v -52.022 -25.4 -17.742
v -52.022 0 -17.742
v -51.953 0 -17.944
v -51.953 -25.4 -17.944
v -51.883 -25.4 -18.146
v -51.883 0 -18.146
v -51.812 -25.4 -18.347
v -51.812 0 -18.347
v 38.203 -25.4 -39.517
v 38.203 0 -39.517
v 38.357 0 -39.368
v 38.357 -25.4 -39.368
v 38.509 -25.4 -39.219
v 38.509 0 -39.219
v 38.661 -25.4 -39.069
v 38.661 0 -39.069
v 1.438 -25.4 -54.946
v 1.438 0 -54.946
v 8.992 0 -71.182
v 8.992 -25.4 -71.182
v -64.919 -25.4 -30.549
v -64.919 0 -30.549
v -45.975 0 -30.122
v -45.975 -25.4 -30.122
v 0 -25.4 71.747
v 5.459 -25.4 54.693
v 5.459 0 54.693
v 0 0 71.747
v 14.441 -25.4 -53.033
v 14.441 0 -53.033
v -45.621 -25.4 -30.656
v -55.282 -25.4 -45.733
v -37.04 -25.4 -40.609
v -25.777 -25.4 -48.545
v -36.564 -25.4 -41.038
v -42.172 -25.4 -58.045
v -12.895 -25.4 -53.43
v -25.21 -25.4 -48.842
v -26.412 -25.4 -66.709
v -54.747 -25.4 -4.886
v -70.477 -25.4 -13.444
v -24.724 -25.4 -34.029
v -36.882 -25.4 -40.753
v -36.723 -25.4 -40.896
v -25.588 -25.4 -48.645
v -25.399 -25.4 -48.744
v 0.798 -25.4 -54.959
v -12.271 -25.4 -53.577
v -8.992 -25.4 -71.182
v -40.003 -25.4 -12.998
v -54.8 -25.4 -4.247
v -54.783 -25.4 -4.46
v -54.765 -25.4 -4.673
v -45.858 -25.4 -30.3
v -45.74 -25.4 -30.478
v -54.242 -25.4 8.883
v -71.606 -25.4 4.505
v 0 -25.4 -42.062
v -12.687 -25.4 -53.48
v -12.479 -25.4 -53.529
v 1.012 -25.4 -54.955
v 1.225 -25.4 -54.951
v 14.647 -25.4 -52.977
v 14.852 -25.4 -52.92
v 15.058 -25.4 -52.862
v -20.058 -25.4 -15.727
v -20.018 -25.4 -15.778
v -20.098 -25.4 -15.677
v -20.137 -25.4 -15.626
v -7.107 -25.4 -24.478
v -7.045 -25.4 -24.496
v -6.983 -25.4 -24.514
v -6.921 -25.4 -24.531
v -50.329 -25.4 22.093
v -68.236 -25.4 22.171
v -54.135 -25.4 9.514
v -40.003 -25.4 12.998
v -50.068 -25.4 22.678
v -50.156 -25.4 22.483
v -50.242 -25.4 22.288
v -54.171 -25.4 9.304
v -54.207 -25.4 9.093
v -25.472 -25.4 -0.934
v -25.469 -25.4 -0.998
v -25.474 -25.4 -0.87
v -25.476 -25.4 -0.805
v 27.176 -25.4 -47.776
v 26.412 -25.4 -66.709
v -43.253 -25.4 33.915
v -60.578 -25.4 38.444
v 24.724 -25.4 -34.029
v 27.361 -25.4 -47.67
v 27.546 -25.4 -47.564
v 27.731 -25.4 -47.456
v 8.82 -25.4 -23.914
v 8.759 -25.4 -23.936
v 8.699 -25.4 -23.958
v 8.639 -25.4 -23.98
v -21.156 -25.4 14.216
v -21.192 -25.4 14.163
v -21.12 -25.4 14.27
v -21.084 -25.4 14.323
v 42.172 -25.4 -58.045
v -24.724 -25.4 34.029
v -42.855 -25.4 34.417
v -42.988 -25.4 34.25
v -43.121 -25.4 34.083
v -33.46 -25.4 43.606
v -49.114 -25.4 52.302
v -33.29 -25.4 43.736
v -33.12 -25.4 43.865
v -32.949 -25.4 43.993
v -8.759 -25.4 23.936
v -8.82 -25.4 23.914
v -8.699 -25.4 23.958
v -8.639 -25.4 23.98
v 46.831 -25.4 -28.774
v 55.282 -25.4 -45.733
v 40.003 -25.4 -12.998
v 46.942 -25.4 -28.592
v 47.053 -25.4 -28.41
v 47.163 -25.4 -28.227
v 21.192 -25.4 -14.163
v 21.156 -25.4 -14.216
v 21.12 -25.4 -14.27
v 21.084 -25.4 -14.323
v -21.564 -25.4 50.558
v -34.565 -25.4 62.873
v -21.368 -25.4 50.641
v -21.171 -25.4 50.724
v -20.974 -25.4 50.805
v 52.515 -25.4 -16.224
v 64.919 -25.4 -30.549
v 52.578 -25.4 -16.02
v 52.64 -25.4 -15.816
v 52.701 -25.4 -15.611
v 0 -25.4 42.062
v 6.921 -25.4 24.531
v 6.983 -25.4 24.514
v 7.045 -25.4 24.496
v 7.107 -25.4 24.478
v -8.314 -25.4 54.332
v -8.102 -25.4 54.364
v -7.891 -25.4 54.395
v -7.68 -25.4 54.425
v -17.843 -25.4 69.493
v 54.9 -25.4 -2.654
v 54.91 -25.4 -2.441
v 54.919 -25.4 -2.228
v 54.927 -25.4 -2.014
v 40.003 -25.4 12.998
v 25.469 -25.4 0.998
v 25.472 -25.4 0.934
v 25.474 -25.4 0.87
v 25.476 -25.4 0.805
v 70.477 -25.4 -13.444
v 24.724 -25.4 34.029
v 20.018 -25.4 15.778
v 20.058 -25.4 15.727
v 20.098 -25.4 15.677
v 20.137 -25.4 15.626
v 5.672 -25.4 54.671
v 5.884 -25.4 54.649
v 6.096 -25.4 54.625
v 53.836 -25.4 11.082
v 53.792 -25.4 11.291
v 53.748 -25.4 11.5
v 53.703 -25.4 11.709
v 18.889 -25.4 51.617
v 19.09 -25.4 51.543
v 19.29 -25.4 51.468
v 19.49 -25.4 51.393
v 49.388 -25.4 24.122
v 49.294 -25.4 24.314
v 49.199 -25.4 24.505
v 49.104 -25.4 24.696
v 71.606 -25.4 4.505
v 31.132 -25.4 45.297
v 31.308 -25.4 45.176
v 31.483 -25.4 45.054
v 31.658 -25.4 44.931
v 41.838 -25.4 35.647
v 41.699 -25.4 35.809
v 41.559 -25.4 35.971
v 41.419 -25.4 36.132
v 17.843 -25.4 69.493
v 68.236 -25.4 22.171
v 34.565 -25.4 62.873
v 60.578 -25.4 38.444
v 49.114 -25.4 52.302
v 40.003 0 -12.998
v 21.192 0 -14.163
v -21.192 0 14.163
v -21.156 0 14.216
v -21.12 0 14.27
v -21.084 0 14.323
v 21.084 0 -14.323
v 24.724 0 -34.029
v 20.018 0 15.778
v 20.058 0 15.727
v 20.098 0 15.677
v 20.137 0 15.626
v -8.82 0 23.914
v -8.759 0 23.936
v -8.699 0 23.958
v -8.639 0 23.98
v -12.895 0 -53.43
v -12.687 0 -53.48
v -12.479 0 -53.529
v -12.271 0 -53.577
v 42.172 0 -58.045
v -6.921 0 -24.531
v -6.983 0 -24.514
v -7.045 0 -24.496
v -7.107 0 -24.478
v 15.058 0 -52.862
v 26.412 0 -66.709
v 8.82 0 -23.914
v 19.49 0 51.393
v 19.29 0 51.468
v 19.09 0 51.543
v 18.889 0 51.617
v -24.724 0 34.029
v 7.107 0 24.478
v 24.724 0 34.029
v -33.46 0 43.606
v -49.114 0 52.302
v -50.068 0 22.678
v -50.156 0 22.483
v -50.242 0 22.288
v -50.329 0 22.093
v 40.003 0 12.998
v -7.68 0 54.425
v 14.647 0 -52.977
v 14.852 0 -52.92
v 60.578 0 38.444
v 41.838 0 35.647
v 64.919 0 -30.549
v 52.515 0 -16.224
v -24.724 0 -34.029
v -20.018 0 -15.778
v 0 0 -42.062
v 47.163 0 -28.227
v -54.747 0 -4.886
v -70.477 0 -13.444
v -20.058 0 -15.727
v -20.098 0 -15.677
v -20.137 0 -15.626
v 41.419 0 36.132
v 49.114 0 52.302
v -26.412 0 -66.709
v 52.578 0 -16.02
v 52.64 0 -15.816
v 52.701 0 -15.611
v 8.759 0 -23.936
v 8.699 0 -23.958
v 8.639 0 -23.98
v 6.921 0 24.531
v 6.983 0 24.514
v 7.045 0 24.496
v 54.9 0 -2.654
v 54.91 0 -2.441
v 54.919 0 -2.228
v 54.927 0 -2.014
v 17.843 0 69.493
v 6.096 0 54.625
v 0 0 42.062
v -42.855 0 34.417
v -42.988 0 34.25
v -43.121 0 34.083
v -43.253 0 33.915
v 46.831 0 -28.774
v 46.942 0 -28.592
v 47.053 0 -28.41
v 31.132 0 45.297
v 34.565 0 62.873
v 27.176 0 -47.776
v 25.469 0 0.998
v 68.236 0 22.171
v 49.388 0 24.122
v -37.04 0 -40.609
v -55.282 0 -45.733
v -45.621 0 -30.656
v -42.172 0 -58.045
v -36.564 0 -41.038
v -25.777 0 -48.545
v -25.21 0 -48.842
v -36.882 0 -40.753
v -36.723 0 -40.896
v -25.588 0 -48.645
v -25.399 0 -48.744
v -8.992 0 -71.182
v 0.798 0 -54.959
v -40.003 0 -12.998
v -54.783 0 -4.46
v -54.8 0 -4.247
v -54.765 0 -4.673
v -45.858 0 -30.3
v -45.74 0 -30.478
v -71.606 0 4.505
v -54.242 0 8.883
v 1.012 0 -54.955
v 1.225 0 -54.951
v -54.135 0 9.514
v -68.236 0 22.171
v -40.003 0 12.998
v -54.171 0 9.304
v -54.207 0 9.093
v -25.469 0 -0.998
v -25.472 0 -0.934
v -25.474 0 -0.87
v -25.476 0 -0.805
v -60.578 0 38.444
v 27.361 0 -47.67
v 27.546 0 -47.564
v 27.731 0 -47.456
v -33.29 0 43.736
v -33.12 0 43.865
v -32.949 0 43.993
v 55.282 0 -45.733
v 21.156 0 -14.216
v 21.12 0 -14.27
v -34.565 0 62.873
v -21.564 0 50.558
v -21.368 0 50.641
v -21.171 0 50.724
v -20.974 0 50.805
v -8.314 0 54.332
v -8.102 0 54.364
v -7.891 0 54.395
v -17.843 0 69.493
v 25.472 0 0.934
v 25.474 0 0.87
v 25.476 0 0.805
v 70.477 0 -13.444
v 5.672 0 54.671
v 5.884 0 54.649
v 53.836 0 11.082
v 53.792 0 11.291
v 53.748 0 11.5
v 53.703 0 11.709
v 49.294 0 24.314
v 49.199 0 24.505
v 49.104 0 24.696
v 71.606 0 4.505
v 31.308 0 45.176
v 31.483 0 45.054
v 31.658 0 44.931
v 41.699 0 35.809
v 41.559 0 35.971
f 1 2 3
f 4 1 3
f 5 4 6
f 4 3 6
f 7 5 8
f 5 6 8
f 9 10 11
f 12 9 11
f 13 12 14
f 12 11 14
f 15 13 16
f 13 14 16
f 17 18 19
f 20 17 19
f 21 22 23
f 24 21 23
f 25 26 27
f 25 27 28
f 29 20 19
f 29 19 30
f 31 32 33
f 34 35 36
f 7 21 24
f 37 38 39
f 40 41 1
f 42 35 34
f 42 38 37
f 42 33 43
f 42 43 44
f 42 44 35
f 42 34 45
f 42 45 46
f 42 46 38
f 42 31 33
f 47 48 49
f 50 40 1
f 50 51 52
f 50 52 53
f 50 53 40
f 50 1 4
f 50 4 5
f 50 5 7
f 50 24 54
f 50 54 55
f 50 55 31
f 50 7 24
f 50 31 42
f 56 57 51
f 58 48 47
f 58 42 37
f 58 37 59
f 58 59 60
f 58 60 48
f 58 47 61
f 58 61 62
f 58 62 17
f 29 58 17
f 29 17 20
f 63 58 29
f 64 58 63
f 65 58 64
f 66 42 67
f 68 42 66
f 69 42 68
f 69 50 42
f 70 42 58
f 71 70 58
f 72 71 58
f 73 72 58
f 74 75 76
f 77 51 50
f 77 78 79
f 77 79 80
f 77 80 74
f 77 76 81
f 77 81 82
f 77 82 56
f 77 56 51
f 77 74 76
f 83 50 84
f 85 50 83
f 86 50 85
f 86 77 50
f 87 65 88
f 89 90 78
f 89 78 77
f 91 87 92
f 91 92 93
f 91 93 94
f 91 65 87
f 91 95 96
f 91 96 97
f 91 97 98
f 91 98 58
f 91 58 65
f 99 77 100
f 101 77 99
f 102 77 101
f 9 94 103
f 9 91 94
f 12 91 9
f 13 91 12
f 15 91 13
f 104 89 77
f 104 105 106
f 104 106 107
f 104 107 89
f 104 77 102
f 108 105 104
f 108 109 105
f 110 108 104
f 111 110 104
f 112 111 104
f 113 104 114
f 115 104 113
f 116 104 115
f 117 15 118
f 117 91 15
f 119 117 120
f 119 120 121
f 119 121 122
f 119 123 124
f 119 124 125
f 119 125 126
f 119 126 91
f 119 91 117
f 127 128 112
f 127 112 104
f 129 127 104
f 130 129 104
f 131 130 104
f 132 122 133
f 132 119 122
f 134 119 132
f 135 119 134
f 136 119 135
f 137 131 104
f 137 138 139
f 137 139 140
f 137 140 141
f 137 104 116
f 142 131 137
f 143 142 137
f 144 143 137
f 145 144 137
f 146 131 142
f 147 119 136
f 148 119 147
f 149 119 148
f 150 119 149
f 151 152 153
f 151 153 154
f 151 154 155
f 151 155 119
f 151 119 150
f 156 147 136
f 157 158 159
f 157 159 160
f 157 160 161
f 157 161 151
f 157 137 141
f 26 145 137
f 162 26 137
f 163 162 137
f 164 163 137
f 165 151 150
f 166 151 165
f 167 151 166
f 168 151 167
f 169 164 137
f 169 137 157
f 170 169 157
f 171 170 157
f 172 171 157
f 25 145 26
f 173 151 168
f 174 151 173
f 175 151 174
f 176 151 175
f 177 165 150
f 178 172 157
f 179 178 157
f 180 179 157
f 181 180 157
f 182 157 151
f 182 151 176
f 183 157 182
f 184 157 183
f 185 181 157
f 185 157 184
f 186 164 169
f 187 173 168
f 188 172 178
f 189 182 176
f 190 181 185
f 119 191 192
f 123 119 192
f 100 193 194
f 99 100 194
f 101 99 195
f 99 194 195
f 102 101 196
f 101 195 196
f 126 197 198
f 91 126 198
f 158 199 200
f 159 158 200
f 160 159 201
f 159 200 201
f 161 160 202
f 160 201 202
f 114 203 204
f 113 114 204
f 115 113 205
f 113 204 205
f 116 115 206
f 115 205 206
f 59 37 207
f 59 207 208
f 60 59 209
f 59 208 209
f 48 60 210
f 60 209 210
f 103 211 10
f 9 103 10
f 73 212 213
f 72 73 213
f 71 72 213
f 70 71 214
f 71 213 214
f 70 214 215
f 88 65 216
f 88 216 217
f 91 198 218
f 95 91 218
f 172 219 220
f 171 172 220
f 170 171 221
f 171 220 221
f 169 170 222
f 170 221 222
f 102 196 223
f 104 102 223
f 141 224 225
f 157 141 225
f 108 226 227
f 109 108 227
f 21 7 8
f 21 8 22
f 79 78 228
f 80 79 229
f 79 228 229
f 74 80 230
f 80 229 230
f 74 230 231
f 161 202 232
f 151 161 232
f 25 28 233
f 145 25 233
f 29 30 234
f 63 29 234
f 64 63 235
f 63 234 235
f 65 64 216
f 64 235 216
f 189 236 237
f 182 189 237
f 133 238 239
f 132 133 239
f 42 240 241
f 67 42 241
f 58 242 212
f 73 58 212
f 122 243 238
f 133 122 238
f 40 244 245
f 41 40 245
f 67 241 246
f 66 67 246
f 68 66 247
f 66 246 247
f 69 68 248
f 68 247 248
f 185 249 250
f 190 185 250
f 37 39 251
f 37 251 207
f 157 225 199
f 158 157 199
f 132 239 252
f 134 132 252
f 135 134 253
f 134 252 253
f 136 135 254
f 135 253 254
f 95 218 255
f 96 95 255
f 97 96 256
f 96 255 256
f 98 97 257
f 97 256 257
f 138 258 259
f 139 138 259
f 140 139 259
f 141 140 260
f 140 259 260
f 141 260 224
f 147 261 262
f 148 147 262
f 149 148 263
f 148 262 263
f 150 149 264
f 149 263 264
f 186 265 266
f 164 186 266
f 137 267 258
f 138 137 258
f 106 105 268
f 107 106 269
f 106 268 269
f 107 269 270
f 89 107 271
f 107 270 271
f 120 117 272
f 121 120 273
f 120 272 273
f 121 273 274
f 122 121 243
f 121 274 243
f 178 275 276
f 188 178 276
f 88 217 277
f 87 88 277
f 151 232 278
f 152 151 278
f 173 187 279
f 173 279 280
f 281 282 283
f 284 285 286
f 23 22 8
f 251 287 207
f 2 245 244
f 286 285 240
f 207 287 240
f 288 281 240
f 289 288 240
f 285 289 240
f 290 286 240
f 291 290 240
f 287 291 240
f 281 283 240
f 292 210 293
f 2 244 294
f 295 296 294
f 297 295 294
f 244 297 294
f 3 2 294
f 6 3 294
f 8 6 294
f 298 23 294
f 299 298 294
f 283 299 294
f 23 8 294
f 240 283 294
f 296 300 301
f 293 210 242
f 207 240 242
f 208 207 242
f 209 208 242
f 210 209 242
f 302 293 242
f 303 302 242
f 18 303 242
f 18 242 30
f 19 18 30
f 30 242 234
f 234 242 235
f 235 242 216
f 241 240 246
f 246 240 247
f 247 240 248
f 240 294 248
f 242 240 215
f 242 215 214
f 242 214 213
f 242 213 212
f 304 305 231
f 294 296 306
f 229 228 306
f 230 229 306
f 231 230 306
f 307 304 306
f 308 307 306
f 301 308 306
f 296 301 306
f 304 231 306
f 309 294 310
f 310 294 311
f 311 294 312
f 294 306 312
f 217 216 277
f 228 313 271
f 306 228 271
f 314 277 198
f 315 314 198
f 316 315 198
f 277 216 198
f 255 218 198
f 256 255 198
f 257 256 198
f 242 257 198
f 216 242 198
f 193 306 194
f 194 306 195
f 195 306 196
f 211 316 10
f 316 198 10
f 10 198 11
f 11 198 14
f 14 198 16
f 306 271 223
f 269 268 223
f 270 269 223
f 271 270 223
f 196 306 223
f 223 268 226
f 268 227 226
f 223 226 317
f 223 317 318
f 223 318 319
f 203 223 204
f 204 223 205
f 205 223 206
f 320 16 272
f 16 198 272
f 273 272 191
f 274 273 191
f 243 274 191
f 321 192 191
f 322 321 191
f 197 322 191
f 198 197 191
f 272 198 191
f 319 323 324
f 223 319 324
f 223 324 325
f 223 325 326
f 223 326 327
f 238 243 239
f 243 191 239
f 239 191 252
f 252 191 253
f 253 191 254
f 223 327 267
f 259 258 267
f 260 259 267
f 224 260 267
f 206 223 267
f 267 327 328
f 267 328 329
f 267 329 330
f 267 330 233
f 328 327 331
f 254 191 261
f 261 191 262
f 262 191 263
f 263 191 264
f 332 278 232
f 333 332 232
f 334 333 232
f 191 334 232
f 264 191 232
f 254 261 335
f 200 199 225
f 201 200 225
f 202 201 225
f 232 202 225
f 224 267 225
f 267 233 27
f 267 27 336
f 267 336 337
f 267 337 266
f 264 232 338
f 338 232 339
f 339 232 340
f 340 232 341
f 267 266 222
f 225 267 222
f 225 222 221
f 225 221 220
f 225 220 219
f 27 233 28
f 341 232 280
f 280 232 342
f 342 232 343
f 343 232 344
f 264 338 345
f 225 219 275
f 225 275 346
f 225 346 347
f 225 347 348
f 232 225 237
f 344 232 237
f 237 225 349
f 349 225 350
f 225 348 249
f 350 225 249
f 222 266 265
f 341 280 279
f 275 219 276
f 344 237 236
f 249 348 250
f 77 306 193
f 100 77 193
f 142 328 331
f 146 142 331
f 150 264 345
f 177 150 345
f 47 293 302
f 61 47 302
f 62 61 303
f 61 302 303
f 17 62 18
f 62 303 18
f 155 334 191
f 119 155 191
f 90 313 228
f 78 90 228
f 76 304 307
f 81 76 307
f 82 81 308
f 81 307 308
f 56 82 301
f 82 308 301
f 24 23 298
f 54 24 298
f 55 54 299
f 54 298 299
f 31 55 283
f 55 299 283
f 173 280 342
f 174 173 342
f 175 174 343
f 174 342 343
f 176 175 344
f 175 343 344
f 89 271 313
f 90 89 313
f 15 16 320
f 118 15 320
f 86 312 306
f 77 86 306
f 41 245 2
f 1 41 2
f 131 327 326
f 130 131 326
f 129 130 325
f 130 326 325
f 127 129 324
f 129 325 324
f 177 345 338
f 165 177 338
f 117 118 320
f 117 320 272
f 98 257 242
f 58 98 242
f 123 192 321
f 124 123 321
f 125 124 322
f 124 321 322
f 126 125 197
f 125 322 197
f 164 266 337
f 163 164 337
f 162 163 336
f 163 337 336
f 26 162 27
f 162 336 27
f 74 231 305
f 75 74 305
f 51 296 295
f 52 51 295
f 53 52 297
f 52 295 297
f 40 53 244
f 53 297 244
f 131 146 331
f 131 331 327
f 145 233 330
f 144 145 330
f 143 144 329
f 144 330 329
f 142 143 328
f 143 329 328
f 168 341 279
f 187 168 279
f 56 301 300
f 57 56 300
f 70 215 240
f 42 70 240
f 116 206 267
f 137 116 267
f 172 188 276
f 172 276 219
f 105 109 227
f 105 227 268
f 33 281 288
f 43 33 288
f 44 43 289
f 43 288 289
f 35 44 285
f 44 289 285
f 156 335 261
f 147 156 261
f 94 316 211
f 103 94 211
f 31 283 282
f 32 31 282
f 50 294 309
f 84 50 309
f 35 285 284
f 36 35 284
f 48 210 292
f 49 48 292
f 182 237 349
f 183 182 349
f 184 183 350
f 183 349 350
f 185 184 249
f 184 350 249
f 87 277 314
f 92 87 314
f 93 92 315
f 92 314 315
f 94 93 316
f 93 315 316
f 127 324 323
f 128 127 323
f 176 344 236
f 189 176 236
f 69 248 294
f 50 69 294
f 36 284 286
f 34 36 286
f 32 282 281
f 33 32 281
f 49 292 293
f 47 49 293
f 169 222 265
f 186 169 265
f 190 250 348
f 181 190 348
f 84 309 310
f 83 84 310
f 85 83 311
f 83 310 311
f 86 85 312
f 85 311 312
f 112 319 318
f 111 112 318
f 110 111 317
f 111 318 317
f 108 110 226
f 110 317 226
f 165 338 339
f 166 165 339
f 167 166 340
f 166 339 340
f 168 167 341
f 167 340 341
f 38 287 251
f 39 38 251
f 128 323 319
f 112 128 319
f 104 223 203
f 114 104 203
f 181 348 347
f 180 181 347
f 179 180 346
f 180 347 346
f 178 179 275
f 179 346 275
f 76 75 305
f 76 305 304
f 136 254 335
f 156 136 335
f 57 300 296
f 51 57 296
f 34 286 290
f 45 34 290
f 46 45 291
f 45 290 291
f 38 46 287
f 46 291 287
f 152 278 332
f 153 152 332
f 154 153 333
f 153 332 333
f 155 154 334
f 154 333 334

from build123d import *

# Parameters (mm, degrees)
F1_DEPTH = 25.4


with BuildPart() as f1:
    # F0 (on Front) → F1 (new body)
    with BuildSketch(Plane.XZ):
        with BuildLine():
            ThreePointArc((54.927443, -2.014457), (54.955138, -1.007398), (54.96437, 0))
            ThreePointArc((54.96437, 0), (54.681442, 5.569728), (53.835571, 11.082115))
            ThreePointArc((53.835571, 11.082115), (53.770084, 11.395616), (53.702771, 11.70873))
            ThreePointArc((53.702771, 11.70873), (51.917841, 18.044937), (49.388218, 24.122312))
            ThreePointArc((49.388218, 24.122312), (49.246823, 24.409678), (49.103757, 24.696215))
            ThreePointArc((49.103757, 24.696215), (45.799154, 30.389464), (41.837621, 35.646816))
            ThreePointArc((41.837621, 35.646816), (41.629204, 35.88999), (41.419373, 36.131946))
            ThreePointArc((41.419373, 36.131946), (36.802736, 40.82451), (31.658212, 44.931499))
            ThreePointArc((31.658212, 44.931499), (31.395868, 45.115202), (31.132458, 45.297374))
            ThreePointArc((31.132458, 45.297374), (25.493868, 48.694401), (19.489602, 51.39297))
            ThreePointArc((19.489602, 51.39297), (19.189815, 51.50566), (18.889376, 51.616601))
            ThreePointArc((18.889376, 51.616601), (12.583126, 53.504644), (6.096388, 54.625233))
            ThreePointArc((6.096388, 54.625233), (5.777995, 54.659828), (5.459405, 54.692567))
            ThreePointArc((5.459405, 54.692567), (-1.11826, 54.952994), (-7.679884, 54.425191))
            ThreePointArc((-7.679884, 54.425191), (-7.996878, 54.379518), (-8.313601, 54.331998))
            ThreePointArc((-8.313601, 54.331998), (-14.749381, 52.948444), (-20.973601, 50.805414))
            ThreePointArc((-20.973601, 50.805414), (-21.269278, 50.682342), (-21.564232, 50.55755))
            ThreePointArc((-21.564232, 50.55755), (-27.453745, 47.61695), (-32.949469, 43.993346))
            ThreePointArc((-32.949469, 43.993346), (-33.20525, 43.800609), (-33.459904, 43.606385))
            ThreePointArc((-33.459904, 43.606385), (-38.433089, 39.293507), (-42.855001, 34.417014))
            ThreePointArc((-42.855001, 34.417014), (-43.054815, 34.166723), (-43.253166, 33.915271))
            ThreePointArc((-43.253166, 33.915271), (-46.99754, 28.501109), (-50.067796, 22.678135))
            ThreePointArc((-50.067796, 22.678135), (-50.199087, 22.386015), (-50.328674, 22.093135))
            ThreePointArc((-50.328674, 22.093135), (-52.608964, 15.917881), (-54.134647, 9.514305))
            ThreePointArc((-54.134647, 9.514305), (-54.189166, 9.198712), (-54.241845, 8.882806))
            ThreePointArc((-54.241845, 8.882806), (-54.914772, 2.334474), (-54.800019, -4.247343))
            ThreePointArc((-54.800019, -4.247343), (-54.77434, -4.56658), (-54.746802, -4.885662))
            ThreePointArc((-54.746802, -4.885662), (-53.770084, -11.395616), (-52.022104, -17.742116))
            ThreePointArc((-52.022104, -17.742116), (-51.917841, -18.044937), (-51.811816, -18.347146))
            ThreePointArc((-51.811816, -18.347146), (-49.246823, -24.409678), (-45.975449, -30.122086))
            ThreePointArc((-45.975449, -30.122086), (-45.799154, -30.389464), (-45.621303, -30.655811))
            ThreePointArc((-45.621303, -30.655811), (-41.629204, -35.88999), (-37.039988, -40.609374))
            ThreePointArc((-37.039988, -40.609374), (-36.802736, -40.82451), (-36.564235, -41.038259))
            ThreePointArc((-36.564235, -41.038259), (-31.395868, -45.115202), (-25.777168, -48.545027))
            ThreePointArc((-25.777168, -48.545027), (-25.493868, -48.694401), (-25.209703, -48.842122))
            ThreePointArc((-25.209703, -48.842122), (-19.189815, -51.50566), (-12.894674, -53.430416))
            ThreePointArc((-12.894674, -53.430416), (-12.583126, -53.504644), (-12.271152, -53.577055))
            ThreePointArc((-12.271152, -53.577055), (-5.777995, -54.659828), (0.798041, -54.958577))
            ThreePointArc((0.798041, -54.958577), (1.11826, -54.952994), (1.438441, -54.945545))
            ThreePointArc((1.438441, -54.945545), (7.996878, -54.379518), (14.440611, -53.033487))
            ThreePointArc((14.440611, -53.033487), (14.749381, -52.948444), (15.057651, -52.861604))
            ThreePointArc((15.057651, -52.861604), (21.269278, -50.682342), (27.175824, -47.776109))
            ThreePointArc((27.175824, -47.776109), (27.453745, -47.61695), (27.730733, -47.456174))
            ThreePointArc((27.730733, -47.456174), (33.20525, -43.800609), (38.203481, -39.516782))
            ThreePointArc((38.203481, -39.516782), (38.433089, -39.293507), (38.661392, -39.068898))
            ThreePointArc((38.661392, -39.068898), (43.054815, -34.166723), (46.830672, -28.77447))
            ThreePointArc((46.830672, -28.77447), (46.99754, -28.501109), (47.162813, -28.226779))
            ThreePointArc((47.162813, -28.226779), (50.199087, -22.386015), (52.51532, -16.224152))
            ThreePointArc((52.51532, -16.224152), (52.608964, -15.917881), (52.700821, -15.611069))
            ThreePointArc((52.700821, -15.611069), (54.189166, -9.198712), (54.900238, -2.654412))
            ThreePointArc((54.900238, -2.654412), (54.914772, -2.334474), (54.927443, -2.014457))
        make_face()
        with BuildLine():
            ThreePointArc((25.469281, 0.998052), (25.472873, 0.901722), (25.476102, 0.80538))
            Line((25.476102, 0.80538), (40.003491, -12.997922))
            Line((40.003491, -12.997922), (21.191721, -14.163027))
            ThreePointArc((21.191721, -14.163027), (21.138007, -14.243071), (21.08399, -14.32291))
            Line((21.08399, -14.32291), (24.723517, -34.029002))
            Line((24.723517, -34.029002), (8.819644, -23.914311))
            ThreePointArc((8.819644, -23.914311), (8.72914, -23.947495), (8.638511, -23.980336))
            Line((8.638511, -23.980336), (0, -42.06216))
            Line((0, -42.06216), (-6.921237, -24.531141))
            ThreePointArc((-6.921237, -24.531141), (-7.013962, -24.50479), (-7.106586, -24.478089))
            Line((-7.106586, -24.478089), (-24.723517, -34.029002))
            Line((-24.723517, -34.029002), (-20.018441, -15.777909))
            ThreePointArc((-20.018441, -15.777909), (-20.077968, -15.702088), (-20.137208, -15.626043))
            Line((-20.137208, -15.626043), (-40.003491, -12.997922))
            Line((-40.003491, -12.997922), (-25.469281, -0.998052))
            ThreePointArc((-25.469281, -0.998052), (-25.472873, -0.901722), (-25.476102, -0.80538))
            Line((-25.476102, -0.80538), (-40.003491, 12.997922))
            Line((-40.003491, 12.997922), (-21.191721, 14.163027))
            ThreePointArc((-21.191721, 14.163027), (-21.138007, 14.243071), (-21.08399, 14.32291))
            Line((-21.08399, 14.32291), (-24.723517, 34.029002))
            Line((-24.723517, 34.029002), (-8.819644, 23.914311))
            ThreePointArc((-8.819644, 23.914311), (-8.72914, 23.947495), (-8.638511, 23.980336))
            Line((-8.638511, 23.980336), (0, 42.06216))
            Line((0, 42.06216), (6.921237, 24.531141))
            ThreePointArc((6.921237, 24.531141), (7.013962, 24.50479), (7.106586, 24.478089))
            Line((7.106586, 24.478089), (24.723517, 34.029002))
            Line((24.723517, 34.029002), (20.018441, 15.777909))
            ThreePointArc((20.018441, 15.777909), (20.077968, 15.702088), (20.137208, 15.626043))
            Line((20.137208, 15.626043), (40.003491, 12.997922))
            Line((40.003491, 12.997922), (25.469281, 0.998052))
        make_face(mode=Mode.SUBTRACT)
        with BuildLine():
            ThreePointArc((-42.855001, 34.417014), (-38.433089, 39.293507), (-33.459904, 43.606385))
            Line((-33.459904, 43.606385), (-49.114439, 52.301566))
            Line((-49.114439, 52.301566), (-42.855001, 34.417014))
        make_face()
        with BuildLine():
            ThreePointArc((-50.067796, 22.678135), (-46.99754, 28.501109), (-43.253166, 33.915271))
            Line((-43.253166, 33.915271), (-60.578289, 38.444151))
            Line((-60.578289, 38.444151), (-50.067796, 22.678135))
        make_face()
        with BuildLine():
            ThreePointArc((-54.134647, 9.514305), (-52.608964, 15.917881), (-50.328674, 22.093135))
            Line((-50.328674, 22.093135), (-68.235783, 22.17115))
            Line((-68.235783, 22.17115), (-54.134647, 9.514305))
        make_face()
        with BuildLine():
            ThreePointArc((-54.800019, -4.247343), (-54.914772, 2.334474), (-54.241845, 8.882806))
            Line((-54.241845, 8.882806), (-71.605771, 4.505053))
            Line((-71.605771, 4.505053), (-54.800019, -4.247343))
        make_face()
        with BuildLine():
            Line((-55.282282, -45.733481), (-37.039988, -40.609374))
            ThreePointArc((-37.039988, -40.609374), (-41.629204, -35.88999), (-45.621303, -30.655811))
            Line((-45.621303, -30.655811), (-55.282282, -45.733481))
        make_face()
        with BuildLine():
            Line((-42.172033, -58.044824), (-25.777168, -48.545027))
            ThreePointArc((-25.777168, -48.545027), (-31.395868, -45.115202), (-36.564235, -41.038259))
            Line((-36.564235, -41.038259), (-42.172033, -58.044824))
        make_face()
        with BuildLine():
            Line((-26.41196, -66.708997), (-12.894674, -53.430416))
            ThreePointArc((-12.894674, -53.430416), (-19.189815, -51.50566), (-25.209703, -48.842122))
            Line((-25.209703, -48.842122), (-26.41196, -66.708997))
        make_face()
        with BuildLine():
            Line((-8.992327, -71.181598), (0.798041, -54.958577))
            ThreePointArc((0.798041, -54.958577), (-5.777995, -54.659828), (-12.271152, -53.577055))
            Line((-12.271152, -53.577055), (-8.992327, -71.181598))
        make_face()
        with BuildLine():
            Line((8.992327, -71.181598), (14.440611, -53.033487))
            ThreePointArc((14.440611, -53.033487), (7.996878, -54.379518), (1.438441, -54.945545))
            Line((1.438441, -54.945545), (8.992327, -71.181598))
        make_face()
        with BuildLine():
            Line((26.41196, -66.708997), (27.175824, -47.776109))
            ThreePointArc((27.175824, -47.776109), (21.269278, -50.682342), (15.057651, -52.861604))
            Line((15.057651, -52.861604), (26.41196, -66.708997))
        make_face()
        with BuildLine():
            Line((42.172033, -58.044824), (38.203481, -39.516782))
            ThreePointArc((38.203481, -39.516782), (33.20525, -43.800609), (27.730733, -47.456174))
            Line((27.730733, -47.456174), (42.172033, -58.044824))
        make_face()
        with BuildLine():
            Line((55.282282, -45.733481), (46.830672, -28.77447))
            ThreePointArc((46.830672, -28.77447), (43.054815, -34.166723), (38.661392, -39.068898))
            Line((38.661392, -39.068898), (55.282282, -45.733481))
        make_face()
        with BuildLine():
            Line((64.918941, -30.548535), (52.51532, -16.224152))
            ThreePointArc((52.51532, -16.224152), (50.199087, -22.386015), (47.162813, -28.226779))
            Line((47.162813, -28.226779), (64.918941, -30.548535))
        make_face()
        with BuildLine():
            Line((70.476505, -13.444112), (54.900238, -2.654412))
            ThreePointArc((54.900238, -2.654412), (54.189166, -9.198712), (52.700821, -15.611069))
            Line((52.700821, -15.611069), (70.476505, -13.444112))
        make_face()
        with BuildLine():
            ThreePointArc((53.835571, 11.082115), (54.681442, 5.569728), (54.96437, 0))
            ThreePointArc((54.96437, 0), (54.955138, -1.007398), (54.927443, -2.014457))
            Line((54.927443, -2.014457), (71.605771, 4.505053))
            Line((71.605771, 4.505053), (53.835571, 11.082115))
        make_face()
        with BuildLine():
            ThreePointArc((49.388218, 24.122312), (51.917841, 18.044937), (53.702771, 11.70873))
            Line((53.702771, 11.70873), (68.235783, 22.17115))
            Line((68.235783, 22.17115), (49.388218, 24.122312))
        make_face()
        with BuildLine():
            ThreePointArc((41.837621, 35.646816), (45.799154, 30.389464), (49.103757, 24.696215))
            Line((49.103757, 24.696215), (60.578289, 38.444151))
            Line((60.578289, 38.444151), (41.837621, 35.646816))
        make_face()
        with BuildLine():
            ThreePointArc((31.658212, 44.931499), (36.802736, 40.82451), (41.419373, 36.131946))
            Line((41.419373, 36.131946), (49.114439, 52.301566))
            Line((49.114439, 52.301566), (31.658212, 44.931499))
        make_face()
        with BuildLine():
            ThreePointArc((19.489602, 51.39297), (25.493868, 48.694401), (31.132458, 45.297374))
            Line((31.132458, 45.297374), (34.564548, 62.87268))
            Line((34.564548, 62.87268), (19.489602, 51.39297))
        make_face()
        with BuildLine():
            ThreePointArc((6.096388, 54.625233), (12.583126, 53.504644), (18.889376, 51.616601))
            Line((18.889376, 51.616601), (17.84284, 69.493273))
            Line((17.84284, 69.493273), (6.096388, 54.625233))
        make_face()
        with BuildLine():
            ThreePointArc((-7.679884, 54.425191), (-1.11826, 54.952994), (5.459405, 54.692567))
            Line((5.459405, 54.692567), (0, 71.747348))
            Line((0, 71.747348), (-7.679884, 54.425191))
        make_face()
        with BuildLine():
            ThreePointArc((-20.973601, 50.805414), (-14.749381, 52.948444), (-8.313601, 54.331998))
            Line((-8.313601, 54.331998), (-17.84284, 69.493273))
            Line((-17.84284, 69.493273), (-20.973601, 50.805414))
        make_face()
        with BuildLine():
            Line((-70.476505, -13.444112), (-52.022104, -17.742116))
            ThreePointArc((-52.022104, -17.742116), (-53.770084, -11.395616), (-54.746802, -4.885662))
            Line((-54.746802, -4.885662), (-70.476505, -13.444112))
        make_face()
        with BuildLine():
            Line((-64.918941, -30.548535), (-45.975449, -30.122086))
            ThreePointArc((-45.975449, -30.122086), (-49.246823, -24.409678), (-51.811816, -18.347146))
            Line((-51.811816, -18.347146), (-64.918941, -30.548535))
        make_face()
        with BuildLine():
            ThreePointArc((-32.949469, 43.993346), (-27.453745, 47.61695), (-21.564232, 50.55755))
            Line((-21.564232, 50.55755), (-34.564548, 62.87268))
            Line((-34.564548, 62.87268), (-32.949469, 43.993346))
        make_face()
    extrude(amount=F1_DEPTH)


solid = f1.part
